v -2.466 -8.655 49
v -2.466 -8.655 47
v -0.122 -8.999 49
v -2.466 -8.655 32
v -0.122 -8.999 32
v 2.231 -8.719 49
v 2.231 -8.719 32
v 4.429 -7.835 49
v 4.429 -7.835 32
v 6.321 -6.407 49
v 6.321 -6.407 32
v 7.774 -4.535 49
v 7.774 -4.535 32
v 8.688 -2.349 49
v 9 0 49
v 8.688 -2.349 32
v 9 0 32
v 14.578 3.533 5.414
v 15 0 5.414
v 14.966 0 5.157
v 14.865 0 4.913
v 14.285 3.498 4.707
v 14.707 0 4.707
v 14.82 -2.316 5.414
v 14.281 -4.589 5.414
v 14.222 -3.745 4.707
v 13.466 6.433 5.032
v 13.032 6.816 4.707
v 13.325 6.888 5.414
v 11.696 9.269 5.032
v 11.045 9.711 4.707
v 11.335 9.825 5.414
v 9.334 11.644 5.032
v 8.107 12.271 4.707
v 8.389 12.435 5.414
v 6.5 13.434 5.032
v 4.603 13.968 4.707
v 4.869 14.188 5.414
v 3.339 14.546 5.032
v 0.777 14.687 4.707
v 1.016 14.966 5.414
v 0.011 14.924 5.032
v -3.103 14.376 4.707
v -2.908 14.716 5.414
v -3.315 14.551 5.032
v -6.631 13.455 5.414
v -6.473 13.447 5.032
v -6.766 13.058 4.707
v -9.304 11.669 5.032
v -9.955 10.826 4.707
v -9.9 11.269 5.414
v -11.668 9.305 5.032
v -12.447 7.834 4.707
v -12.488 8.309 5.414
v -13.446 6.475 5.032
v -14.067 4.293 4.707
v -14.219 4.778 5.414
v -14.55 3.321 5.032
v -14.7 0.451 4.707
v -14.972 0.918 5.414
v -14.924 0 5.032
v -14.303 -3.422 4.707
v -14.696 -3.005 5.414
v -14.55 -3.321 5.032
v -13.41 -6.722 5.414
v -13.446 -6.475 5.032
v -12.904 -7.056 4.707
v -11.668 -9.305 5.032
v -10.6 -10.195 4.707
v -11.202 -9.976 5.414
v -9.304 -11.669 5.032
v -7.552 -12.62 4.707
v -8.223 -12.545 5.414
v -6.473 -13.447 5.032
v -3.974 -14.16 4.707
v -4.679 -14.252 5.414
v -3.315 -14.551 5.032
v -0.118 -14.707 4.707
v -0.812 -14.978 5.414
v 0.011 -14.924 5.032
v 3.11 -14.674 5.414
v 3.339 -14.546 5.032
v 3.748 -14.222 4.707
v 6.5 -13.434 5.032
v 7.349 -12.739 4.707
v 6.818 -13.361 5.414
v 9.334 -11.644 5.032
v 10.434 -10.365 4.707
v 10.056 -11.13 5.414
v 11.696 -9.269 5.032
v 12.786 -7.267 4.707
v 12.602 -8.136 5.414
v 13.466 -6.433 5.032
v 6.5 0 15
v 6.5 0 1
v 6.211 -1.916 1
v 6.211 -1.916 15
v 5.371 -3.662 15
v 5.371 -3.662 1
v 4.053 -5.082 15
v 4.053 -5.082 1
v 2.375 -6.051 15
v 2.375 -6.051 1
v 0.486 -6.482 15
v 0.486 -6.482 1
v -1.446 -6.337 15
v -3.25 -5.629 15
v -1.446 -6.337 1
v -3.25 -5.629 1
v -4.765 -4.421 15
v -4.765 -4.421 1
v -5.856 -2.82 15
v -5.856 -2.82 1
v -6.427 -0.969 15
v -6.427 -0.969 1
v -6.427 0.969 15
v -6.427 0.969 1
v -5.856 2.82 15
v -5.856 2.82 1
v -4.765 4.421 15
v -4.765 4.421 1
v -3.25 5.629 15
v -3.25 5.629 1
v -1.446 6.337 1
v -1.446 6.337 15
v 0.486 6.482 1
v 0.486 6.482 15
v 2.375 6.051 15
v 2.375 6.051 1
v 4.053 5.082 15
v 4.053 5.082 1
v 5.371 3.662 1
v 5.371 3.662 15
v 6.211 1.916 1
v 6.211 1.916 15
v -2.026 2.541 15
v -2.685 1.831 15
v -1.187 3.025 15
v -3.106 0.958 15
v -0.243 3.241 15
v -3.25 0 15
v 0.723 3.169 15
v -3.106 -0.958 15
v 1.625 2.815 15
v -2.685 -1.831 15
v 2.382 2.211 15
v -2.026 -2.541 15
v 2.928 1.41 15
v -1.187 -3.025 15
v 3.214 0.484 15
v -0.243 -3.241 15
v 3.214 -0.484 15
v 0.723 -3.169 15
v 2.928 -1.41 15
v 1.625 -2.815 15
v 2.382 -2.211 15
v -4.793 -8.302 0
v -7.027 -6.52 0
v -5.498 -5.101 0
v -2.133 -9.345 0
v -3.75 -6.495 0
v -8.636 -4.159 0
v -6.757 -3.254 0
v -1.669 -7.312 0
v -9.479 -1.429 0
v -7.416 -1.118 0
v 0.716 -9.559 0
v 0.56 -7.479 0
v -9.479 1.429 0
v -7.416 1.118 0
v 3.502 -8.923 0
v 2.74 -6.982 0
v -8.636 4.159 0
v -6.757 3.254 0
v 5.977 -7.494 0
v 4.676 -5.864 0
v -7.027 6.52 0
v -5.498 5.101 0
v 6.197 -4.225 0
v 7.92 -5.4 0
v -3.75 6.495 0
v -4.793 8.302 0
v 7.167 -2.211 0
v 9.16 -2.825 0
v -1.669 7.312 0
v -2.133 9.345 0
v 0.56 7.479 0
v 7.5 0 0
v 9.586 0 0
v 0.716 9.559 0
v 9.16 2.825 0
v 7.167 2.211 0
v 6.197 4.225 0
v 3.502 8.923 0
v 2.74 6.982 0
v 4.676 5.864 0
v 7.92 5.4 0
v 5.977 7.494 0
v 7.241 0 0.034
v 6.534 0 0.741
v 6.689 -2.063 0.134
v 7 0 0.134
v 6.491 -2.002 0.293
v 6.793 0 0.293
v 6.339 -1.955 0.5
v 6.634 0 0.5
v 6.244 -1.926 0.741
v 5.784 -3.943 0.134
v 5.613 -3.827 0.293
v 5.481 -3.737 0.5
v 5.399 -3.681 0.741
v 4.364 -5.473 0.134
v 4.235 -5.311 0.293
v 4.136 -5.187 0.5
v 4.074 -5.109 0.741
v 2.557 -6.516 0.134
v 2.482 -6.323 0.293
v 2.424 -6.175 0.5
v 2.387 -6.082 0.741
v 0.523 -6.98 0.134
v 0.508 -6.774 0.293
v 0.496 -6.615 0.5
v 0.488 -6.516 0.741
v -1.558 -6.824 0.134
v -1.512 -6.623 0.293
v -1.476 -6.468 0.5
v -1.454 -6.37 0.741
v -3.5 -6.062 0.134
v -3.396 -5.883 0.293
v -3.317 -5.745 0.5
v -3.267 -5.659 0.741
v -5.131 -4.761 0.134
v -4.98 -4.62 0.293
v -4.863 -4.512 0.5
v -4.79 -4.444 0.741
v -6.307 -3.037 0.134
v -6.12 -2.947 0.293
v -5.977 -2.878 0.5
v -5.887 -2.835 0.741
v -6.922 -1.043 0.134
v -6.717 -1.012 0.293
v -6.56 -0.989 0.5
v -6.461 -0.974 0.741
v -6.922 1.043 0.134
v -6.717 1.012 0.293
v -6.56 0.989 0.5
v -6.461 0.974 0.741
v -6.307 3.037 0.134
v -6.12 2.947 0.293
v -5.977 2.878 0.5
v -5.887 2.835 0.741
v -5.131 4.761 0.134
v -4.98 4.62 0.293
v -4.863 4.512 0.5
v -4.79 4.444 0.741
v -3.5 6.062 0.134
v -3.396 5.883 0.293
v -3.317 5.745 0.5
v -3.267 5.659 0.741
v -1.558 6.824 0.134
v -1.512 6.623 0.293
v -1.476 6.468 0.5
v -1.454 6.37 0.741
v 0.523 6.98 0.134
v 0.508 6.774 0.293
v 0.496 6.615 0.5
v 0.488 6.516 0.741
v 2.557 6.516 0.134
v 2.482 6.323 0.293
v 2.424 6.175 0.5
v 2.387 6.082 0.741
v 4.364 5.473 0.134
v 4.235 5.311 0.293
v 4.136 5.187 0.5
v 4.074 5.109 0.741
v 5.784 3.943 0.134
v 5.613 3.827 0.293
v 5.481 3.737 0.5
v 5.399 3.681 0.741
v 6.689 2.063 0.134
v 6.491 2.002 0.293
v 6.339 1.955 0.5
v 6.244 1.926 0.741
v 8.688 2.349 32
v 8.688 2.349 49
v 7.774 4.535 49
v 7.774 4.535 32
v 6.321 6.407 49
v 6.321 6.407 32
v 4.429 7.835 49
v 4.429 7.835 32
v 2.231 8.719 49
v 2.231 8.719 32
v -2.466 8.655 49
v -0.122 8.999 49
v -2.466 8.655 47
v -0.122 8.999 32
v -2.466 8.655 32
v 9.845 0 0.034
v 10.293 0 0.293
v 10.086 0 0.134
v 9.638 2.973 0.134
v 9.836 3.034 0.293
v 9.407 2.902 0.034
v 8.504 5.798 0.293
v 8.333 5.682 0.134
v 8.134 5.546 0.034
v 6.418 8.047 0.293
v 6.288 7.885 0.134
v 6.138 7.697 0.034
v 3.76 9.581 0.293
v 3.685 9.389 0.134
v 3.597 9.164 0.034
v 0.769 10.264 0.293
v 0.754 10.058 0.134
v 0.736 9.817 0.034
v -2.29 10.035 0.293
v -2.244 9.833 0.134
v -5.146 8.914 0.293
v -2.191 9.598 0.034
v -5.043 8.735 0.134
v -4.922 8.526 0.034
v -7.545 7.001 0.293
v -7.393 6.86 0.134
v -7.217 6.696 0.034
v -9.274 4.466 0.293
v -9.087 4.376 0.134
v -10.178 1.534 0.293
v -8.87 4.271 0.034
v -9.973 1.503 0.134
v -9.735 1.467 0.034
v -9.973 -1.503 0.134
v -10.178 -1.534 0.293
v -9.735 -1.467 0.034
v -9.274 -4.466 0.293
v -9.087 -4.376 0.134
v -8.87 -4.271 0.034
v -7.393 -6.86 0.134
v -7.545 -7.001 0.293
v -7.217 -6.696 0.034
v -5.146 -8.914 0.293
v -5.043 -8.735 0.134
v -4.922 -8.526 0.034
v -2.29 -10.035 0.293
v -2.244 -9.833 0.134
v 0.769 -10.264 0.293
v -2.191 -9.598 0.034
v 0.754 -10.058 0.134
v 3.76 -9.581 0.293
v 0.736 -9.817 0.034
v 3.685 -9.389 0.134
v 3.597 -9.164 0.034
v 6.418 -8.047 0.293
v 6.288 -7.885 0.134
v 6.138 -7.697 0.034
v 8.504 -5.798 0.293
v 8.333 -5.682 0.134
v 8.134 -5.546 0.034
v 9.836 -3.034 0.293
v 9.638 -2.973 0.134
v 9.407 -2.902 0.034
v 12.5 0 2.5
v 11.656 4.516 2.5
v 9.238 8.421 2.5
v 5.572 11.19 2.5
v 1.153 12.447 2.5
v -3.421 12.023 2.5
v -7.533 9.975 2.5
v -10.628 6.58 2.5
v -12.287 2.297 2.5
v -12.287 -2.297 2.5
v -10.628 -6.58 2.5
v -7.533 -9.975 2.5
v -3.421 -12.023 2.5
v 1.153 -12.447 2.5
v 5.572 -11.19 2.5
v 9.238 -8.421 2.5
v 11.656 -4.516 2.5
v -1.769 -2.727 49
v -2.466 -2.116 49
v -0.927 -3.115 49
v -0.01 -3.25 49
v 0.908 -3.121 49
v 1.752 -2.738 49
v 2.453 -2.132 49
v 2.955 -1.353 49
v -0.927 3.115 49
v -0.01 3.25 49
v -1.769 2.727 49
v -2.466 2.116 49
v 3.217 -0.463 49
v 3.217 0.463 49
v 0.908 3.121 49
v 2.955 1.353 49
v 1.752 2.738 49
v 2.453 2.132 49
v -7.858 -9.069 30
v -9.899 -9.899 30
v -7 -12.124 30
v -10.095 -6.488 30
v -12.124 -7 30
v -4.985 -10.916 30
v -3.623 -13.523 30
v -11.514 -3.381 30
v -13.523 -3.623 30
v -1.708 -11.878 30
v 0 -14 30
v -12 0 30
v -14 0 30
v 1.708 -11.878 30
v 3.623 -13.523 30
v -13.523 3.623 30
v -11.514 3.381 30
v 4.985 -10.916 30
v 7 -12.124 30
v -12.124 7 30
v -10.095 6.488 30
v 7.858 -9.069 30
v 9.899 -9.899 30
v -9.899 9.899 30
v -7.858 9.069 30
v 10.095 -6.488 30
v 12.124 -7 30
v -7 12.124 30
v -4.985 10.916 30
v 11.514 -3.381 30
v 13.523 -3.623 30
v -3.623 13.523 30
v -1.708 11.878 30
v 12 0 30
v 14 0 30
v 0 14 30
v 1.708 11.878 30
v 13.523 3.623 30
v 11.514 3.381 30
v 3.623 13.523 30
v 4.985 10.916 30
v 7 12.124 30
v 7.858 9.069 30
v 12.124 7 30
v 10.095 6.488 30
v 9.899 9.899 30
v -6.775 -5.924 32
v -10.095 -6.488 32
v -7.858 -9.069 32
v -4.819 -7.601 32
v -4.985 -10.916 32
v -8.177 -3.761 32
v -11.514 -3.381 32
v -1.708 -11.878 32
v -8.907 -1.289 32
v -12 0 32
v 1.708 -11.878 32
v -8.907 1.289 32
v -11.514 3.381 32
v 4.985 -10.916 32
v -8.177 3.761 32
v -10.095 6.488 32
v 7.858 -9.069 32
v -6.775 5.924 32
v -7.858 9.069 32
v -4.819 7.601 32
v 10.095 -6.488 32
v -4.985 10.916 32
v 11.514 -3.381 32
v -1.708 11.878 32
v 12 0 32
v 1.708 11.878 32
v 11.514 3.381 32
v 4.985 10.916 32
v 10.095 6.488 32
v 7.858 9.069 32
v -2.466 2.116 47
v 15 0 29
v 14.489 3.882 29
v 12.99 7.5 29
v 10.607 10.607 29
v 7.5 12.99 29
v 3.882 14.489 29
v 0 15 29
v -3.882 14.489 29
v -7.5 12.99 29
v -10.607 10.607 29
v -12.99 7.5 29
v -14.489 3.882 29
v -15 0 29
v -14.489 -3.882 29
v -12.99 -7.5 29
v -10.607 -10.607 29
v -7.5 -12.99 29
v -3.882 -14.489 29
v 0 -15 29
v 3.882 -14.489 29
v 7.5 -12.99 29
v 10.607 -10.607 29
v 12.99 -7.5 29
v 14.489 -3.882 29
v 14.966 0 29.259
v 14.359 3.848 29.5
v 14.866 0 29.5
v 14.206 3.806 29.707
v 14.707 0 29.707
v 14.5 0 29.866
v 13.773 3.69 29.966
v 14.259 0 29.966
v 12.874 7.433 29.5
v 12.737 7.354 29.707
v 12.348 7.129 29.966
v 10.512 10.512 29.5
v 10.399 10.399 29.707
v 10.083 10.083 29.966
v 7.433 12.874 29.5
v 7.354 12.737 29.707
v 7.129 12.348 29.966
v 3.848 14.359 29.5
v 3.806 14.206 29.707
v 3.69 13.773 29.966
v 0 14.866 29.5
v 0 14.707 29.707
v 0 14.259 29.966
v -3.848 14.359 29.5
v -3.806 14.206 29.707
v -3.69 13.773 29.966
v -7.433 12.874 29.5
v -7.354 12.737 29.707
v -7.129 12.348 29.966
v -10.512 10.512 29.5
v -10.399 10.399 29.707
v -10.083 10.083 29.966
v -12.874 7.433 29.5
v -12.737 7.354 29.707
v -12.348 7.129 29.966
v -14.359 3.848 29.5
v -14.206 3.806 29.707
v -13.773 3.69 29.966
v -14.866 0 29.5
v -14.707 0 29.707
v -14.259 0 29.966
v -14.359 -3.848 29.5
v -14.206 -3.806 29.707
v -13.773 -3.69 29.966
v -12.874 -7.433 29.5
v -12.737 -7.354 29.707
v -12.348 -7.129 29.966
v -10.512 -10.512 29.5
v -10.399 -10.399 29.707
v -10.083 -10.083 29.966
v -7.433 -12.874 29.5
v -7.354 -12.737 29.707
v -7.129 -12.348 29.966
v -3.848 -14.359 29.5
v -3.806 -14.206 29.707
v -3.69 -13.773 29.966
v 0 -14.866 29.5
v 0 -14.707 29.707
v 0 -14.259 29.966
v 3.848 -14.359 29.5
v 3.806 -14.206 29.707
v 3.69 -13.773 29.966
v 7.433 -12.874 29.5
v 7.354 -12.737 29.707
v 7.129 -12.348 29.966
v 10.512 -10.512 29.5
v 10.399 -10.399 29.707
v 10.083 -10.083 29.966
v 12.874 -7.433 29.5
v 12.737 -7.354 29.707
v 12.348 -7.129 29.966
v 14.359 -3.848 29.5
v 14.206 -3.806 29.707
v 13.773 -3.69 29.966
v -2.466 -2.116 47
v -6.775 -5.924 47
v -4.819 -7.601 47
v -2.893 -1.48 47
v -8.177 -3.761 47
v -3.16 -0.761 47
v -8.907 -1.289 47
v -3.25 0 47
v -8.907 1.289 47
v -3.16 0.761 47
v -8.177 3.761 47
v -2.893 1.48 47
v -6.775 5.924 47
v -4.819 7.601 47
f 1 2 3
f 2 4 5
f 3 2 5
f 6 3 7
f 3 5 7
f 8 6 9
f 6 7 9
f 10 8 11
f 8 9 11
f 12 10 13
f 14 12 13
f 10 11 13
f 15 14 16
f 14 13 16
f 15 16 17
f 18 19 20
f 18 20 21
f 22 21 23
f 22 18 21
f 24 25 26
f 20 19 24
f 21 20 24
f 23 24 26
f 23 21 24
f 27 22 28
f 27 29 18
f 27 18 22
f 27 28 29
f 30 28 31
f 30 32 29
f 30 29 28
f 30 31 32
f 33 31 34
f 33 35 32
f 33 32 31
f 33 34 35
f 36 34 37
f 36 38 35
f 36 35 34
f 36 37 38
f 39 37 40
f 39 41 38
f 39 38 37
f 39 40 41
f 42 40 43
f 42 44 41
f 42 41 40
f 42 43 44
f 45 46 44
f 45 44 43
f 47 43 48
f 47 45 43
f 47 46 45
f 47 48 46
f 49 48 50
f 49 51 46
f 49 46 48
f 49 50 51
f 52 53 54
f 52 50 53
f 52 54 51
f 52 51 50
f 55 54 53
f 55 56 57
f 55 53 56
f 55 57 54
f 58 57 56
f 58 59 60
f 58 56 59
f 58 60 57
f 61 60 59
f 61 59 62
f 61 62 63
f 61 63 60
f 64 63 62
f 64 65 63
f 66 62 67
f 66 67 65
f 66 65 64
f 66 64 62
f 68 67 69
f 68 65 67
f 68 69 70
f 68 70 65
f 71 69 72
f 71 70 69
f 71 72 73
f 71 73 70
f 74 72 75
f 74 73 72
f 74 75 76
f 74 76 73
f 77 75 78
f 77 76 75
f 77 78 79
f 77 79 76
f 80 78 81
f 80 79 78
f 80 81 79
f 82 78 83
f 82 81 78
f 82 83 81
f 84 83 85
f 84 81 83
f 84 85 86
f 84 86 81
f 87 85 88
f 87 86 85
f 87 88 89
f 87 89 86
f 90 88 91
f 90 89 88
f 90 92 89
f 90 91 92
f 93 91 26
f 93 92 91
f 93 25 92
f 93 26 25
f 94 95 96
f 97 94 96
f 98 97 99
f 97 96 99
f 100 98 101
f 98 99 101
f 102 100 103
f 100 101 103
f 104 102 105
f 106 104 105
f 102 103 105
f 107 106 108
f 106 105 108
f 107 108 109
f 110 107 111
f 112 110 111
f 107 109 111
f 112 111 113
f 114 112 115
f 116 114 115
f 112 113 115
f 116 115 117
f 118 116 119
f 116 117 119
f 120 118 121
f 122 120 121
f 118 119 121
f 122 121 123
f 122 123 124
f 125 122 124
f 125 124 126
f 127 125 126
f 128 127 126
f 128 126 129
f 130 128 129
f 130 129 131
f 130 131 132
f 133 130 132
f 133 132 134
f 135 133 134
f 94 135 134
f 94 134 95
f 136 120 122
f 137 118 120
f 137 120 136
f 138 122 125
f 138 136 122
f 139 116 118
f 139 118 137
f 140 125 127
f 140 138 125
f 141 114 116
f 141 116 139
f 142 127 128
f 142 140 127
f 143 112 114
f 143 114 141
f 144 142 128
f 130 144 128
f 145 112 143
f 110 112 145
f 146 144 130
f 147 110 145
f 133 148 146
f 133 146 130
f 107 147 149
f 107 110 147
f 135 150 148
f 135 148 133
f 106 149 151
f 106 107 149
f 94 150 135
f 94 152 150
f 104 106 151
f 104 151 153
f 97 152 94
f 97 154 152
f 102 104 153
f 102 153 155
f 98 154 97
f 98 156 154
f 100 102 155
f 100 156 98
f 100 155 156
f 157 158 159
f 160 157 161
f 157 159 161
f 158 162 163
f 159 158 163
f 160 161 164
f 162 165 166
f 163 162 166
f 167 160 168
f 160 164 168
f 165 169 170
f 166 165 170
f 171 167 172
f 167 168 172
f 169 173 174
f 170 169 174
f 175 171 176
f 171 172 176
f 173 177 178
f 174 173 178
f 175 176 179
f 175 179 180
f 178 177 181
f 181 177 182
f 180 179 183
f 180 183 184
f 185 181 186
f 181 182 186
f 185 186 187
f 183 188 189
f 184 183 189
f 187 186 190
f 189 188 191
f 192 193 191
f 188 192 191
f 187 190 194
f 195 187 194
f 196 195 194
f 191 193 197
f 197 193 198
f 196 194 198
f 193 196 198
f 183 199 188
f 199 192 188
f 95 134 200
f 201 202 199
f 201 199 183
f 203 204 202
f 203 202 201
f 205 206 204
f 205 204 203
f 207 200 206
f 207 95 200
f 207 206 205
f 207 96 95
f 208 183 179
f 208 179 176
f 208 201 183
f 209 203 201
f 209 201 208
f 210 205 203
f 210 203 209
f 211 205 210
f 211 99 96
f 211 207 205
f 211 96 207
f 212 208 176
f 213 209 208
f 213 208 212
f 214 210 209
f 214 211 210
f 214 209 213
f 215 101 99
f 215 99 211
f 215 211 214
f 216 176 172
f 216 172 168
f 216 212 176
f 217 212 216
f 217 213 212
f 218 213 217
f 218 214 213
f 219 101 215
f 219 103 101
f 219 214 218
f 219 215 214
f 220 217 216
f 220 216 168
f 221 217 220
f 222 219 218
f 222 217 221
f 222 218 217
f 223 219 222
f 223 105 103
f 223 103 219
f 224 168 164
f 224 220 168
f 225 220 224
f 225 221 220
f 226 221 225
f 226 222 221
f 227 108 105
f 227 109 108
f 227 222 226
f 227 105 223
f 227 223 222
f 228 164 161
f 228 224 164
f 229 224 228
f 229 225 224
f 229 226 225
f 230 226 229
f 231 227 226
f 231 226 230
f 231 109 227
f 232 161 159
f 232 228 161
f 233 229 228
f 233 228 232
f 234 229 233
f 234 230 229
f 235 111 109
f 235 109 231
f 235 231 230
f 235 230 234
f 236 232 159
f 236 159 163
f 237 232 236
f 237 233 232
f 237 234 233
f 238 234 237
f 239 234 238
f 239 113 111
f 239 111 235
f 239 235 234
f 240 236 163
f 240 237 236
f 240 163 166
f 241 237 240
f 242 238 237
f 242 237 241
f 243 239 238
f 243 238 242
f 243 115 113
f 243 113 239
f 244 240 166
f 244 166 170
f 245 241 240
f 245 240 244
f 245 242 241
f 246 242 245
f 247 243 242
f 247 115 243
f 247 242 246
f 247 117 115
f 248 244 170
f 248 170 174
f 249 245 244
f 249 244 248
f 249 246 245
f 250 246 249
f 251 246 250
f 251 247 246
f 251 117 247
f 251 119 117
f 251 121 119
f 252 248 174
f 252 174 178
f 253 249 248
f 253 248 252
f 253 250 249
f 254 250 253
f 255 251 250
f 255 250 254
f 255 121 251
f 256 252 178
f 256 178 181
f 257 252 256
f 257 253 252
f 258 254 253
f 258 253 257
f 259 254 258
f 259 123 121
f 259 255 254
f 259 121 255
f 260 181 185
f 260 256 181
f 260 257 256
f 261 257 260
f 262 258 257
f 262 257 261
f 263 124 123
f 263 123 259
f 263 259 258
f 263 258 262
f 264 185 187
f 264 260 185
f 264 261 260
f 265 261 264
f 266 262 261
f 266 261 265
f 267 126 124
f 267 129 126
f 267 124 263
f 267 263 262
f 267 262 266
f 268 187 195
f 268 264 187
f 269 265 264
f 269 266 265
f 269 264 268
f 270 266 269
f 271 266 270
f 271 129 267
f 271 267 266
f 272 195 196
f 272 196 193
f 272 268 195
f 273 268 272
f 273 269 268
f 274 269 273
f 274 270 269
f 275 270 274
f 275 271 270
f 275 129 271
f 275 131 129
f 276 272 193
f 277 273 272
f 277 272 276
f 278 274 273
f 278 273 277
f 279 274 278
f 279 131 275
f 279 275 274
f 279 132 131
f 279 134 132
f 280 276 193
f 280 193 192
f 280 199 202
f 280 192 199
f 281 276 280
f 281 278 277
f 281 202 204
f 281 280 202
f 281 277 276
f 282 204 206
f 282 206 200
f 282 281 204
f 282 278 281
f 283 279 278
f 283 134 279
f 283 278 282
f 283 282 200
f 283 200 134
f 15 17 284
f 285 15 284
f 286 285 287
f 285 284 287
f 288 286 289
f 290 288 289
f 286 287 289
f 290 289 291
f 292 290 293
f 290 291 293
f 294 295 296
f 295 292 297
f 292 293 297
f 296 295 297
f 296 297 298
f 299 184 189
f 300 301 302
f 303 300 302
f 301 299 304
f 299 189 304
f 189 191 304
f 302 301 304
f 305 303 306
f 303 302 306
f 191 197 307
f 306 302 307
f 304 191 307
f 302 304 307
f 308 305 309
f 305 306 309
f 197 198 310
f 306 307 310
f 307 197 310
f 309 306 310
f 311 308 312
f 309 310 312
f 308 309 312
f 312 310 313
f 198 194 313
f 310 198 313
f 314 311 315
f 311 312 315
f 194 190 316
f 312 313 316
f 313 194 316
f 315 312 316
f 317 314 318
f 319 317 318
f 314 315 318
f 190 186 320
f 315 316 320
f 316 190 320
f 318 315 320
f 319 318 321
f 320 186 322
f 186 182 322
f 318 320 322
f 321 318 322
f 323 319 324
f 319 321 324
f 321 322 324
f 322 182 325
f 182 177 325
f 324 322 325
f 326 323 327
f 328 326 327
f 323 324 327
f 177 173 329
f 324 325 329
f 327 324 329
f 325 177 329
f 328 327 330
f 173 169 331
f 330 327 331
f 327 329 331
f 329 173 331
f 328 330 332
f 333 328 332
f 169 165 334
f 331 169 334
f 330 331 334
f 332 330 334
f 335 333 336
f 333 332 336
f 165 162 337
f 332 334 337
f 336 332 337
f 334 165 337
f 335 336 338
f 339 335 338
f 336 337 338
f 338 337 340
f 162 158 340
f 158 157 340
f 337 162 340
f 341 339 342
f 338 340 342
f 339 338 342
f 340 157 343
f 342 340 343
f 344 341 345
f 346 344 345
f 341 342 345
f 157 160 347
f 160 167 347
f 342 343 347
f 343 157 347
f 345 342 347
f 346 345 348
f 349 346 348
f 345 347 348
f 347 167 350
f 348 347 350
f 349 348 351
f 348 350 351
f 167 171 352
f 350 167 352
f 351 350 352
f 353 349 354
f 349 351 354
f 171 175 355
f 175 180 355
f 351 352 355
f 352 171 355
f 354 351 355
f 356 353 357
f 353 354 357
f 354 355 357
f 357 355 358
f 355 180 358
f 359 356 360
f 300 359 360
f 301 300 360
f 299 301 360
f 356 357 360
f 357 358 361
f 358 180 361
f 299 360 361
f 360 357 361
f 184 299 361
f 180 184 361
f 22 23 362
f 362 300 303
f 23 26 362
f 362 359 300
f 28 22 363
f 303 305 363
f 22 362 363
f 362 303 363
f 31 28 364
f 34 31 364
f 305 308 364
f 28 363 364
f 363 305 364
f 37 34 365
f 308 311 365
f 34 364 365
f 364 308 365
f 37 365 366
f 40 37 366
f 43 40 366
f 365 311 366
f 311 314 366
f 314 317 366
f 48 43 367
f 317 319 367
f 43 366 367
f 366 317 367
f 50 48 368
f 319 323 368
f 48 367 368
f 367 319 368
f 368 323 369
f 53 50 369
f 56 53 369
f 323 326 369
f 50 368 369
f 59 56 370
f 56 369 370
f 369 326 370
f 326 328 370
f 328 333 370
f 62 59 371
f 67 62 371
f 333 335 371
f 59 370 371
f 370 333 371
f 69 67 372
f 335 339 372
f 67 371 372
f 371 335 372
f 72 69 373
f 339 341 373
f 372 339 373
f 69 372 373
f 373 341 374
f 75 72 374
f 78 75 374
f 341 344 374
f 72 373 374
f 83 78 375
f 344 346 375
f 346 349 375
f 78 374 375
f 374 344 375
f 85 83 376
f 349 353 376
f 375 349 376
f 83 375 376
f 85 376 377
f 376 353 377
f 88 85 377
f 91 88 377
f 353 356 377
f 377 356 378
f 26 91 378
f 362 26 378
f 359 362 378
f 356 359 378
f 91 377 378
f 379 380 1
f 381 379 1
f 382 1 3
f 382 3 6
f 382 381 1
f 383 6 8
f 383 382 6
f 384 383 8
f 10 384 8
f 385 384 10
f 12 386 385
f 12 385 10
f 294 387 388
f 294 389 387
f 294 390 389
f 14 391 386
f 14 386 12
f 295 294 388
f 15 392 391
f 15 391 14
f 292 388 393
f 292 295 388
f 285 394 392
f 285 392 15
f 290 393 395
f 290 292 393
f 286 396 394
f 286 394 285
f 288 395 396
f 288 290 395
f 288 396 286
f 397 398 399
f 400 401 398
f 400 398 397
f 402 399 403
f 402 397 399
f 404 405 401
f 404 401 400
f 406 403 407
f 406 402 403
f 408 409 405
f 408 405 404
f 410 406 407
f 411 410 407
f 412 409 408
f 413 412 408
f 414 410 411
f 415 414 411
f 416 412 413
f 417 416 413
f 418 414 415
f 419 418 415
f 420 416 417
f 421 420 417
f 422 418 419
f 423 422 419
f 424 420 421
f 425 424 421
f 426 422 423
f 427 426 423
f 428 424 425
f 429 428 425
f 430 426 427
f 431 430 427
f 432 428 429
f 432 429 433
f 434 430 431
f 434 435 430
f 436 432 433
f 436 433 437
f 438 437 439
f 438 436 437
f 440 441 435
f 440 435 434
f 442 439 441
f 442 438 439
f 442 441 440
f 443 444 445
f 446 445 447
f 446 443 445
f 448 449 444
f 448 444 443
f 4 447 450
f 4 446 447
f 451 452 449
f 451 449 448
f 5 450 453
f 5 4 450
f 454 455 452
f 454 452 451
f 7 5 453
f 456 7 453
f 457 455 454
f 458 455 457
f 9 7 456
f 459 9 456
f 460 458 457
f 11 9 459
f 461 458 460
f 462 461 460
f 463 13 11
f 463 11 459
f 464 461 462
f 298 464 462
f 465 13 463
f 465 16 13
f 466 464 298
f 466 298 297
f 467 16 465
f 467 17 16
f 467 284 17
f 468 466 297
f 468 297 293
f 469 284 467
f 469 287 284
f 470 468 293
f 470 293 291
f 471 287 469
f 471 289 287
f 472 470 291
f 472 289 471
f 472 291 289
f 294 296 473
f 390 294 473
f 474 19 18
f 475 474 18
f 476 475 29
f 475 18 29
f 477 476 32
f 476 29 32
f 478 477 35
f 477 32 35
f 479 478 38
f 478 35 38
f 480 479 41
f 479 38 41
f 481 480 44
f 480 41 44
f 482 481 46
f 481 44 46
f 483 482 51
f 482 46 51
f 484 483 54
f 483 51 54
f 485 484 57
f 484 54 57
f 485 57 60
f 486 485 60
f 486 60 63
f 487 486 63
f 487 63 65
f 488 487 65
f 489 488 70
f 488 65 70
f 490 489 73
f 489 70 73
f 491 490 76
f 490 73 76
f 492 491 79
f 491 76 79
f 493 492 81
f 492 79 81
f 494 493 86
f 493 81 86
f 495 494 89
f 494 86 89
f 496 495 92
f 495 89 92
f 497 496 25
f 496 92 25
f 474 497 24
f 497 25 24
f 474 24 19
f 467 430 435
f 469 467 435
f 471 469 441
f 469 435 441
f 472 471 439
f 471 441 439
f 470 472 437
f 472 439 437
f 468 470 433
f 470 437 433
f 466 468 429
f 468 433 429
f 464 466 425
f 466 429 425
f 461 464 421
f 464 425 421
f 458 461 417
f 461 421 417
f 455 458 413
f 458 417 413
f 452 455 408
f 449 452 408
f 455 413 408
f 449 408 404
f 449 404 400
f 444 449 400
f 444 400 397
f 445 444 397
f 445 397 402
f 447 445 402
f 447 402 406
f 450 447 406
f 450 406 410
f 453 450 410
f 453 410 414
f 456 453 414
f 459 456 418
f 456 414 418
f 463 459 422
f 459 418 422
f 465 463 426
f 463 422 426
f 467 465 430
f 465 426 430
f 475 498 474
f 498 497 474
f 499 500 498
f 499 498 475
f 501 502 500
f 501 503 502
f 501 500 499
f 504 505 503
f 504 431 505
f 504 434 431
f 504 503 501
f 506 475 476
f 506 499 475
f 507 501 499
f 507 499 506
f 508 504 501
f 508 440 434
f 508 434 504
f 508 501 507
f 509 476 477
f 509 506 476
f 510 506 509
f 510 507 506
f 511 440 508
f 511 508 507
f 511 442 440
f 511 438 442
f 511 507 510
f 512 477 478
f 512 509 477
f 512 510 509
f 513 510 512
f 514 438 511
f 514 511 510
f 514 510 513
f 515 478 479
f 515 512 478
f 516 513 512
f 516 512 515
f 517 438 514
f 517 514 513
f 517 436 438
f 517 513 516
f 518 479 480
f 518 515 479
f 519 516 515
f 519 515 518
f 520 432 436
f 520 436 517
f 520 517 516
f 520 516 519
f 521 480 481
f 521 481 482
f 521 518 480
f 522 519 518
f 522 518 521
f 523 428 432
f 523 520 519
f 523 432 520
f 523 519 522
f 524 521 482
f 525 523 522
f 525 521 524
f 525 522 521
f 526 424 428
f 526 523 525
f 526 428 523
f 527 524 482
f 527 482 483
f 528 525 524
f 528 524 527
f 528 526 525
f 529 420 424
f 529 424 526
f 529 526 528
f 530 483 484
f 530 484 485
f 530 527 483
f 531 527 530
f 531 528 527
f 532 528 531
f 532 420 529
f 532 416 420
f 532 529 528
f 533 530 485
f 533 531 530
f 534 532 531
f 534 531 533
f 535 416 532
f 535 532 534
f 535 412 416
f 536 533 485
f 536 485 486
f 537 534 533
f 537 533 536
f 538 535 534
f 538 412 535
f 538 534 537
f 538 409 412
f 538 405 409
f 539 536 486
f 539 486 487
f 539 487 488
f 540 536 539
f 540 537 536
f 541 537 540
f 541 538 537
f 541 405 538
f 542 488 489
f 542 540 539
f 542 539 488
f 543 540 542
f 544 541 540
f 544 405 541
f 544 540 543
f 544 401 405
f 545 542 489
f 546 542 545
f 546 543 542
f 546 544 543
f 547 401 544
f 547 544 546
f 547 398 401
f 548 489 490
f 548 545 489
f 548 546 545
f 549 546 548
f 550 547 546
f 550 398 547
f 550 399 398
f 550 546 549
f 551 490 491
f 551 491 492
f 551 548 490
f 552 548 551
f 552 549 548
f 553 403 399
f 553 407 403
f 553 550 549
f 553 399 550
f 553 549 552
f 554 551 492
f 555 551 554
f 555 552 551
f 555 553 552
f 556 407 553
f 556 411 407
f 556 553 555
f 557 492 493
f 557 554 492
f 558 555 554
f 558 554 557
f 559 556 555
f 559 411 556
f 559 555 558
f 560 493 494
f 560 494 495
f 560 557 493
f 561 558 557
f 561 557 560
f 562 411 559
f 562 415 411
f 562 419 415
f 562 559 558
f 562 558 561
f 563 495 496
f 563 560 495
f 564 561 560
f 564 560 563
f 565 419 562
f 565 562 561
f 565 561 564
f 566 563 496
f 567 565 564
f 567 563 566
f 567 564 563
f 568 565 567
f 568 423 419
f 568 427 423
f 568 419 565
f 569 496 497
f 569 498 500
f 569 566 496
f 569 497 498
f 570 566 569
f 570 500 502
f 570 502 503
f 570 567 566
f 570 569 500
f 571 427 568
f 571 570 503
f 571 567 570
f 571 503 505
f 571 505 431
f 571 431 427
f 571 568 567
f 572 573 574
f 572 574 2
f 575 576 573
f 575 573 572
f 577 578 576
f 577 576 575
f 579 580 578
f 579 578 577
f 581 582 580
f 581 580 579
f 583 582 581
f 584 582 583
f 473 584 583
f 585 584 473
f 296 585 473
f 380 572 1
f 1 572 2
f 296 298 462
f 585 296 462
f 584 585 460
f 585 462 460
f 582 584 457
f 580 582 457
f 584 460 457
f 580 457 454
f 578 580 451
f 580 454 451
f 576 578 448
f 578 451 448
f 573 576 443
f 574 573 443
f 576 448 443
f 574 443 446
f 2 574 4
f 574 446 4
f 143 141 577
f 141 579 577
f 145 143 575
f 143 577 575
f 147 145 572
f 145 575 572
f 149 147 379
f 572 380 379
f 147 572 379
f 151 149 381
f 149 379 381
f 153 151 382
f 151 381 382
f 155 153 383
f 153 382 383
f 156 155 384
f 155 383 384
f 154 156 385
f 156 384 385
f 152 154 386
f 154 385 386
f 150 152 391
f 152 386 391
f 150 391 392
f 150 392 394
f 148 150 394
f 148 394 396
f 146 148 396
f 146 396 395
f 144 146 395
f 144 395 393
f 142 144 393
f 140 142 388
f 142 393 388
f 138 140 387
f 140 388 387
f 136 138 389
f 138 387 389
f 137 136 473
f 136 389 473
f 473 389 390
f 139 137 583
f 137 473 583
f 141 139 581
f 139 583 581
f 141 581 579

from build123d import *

# Parameters (mm, degrees)
F0_R           = 15
F1_DEPTH       = 30
F2_R           = 12
F3_DEPTH       = 2
F5_DEPTH       = 17
F6_DEPTH       = 15
F7_D           = 6.5
F7_CBORE_D     = 13
F7_CBORE_DEPTH = 15
F8_SIZE        = 5
F9_R           = 1


with BuildPart() as f1:
    # F0 (on Top) → F1 (new body)
    with BuildSketch(Plane.XY):
        Circle(F0_R)
    extrude(amount=F1_DEPTH)

    # F2 (on face) → F3 (join)
    with BuildSketch(Plane.XY.offset(30)):
        Circle(F2_R)
    extrude(amount=F3_DEPTH)

    # F4 (on face) → F5 (join)
    with BuildSketch(Plane.XY.offset(32)):
        with BuildLine():
            ThreePointArc((-2.4664324925, -8.6554439955), (5.4222738573, -7.1832406486), (9, 0))
            ThreePointArc((9, 0), (5.4222738573, 7.1832406486), (-2.4664324925, 8.6554439955))
            Line((-2.4664324925, 8.6554439955), (-2.4664324925, -8.6554439955))
        make_face()
    extrude(amount=F5_DEPTH)

    # F4 (on face) → F6 (join)
    with BuildSketch(Plane.XY.offset(32)):
        with BuildLine():
            Line((-2.4664324925, -8.6554439955), (-2.4664324925, 8.6554439955))
            ThreePointArc((-2.4664324925, 8.6554439955), (-9, 0), (-2.4664324925, -8.6554439955))
        make_face()
    extrude(amount=F6_DEPTH)

    # F7 (through all)
    with Locations(Plane(origin=(0, 0, 0), x_dir=(1, 0, 0), z_dir=(0, 0, -1))):
        with Locations((0, 0)):
            CounterBoreHole(F7_D / 2, F7_CBORE_D / 2, F7_CBORE_DEPTH)

    # F8
    f8_edges = [f1.edges().sort_by_distance(p)[0] for p in [
        (-15, 0, 0),
    ]]
    chamfer(f8_edges, length=F8_SIZE)

    # F9
    f9_edges = [f1.edges().sort_by_distance(p)[0] for p in [
        (-15, 0, 30),
        (-10, 0, 0),
        (-15, 0, 5),
        (-6.5, 0, 0),
    ]]
    fillet(f9_edges, radius=F9_R)


solid = f1.part
